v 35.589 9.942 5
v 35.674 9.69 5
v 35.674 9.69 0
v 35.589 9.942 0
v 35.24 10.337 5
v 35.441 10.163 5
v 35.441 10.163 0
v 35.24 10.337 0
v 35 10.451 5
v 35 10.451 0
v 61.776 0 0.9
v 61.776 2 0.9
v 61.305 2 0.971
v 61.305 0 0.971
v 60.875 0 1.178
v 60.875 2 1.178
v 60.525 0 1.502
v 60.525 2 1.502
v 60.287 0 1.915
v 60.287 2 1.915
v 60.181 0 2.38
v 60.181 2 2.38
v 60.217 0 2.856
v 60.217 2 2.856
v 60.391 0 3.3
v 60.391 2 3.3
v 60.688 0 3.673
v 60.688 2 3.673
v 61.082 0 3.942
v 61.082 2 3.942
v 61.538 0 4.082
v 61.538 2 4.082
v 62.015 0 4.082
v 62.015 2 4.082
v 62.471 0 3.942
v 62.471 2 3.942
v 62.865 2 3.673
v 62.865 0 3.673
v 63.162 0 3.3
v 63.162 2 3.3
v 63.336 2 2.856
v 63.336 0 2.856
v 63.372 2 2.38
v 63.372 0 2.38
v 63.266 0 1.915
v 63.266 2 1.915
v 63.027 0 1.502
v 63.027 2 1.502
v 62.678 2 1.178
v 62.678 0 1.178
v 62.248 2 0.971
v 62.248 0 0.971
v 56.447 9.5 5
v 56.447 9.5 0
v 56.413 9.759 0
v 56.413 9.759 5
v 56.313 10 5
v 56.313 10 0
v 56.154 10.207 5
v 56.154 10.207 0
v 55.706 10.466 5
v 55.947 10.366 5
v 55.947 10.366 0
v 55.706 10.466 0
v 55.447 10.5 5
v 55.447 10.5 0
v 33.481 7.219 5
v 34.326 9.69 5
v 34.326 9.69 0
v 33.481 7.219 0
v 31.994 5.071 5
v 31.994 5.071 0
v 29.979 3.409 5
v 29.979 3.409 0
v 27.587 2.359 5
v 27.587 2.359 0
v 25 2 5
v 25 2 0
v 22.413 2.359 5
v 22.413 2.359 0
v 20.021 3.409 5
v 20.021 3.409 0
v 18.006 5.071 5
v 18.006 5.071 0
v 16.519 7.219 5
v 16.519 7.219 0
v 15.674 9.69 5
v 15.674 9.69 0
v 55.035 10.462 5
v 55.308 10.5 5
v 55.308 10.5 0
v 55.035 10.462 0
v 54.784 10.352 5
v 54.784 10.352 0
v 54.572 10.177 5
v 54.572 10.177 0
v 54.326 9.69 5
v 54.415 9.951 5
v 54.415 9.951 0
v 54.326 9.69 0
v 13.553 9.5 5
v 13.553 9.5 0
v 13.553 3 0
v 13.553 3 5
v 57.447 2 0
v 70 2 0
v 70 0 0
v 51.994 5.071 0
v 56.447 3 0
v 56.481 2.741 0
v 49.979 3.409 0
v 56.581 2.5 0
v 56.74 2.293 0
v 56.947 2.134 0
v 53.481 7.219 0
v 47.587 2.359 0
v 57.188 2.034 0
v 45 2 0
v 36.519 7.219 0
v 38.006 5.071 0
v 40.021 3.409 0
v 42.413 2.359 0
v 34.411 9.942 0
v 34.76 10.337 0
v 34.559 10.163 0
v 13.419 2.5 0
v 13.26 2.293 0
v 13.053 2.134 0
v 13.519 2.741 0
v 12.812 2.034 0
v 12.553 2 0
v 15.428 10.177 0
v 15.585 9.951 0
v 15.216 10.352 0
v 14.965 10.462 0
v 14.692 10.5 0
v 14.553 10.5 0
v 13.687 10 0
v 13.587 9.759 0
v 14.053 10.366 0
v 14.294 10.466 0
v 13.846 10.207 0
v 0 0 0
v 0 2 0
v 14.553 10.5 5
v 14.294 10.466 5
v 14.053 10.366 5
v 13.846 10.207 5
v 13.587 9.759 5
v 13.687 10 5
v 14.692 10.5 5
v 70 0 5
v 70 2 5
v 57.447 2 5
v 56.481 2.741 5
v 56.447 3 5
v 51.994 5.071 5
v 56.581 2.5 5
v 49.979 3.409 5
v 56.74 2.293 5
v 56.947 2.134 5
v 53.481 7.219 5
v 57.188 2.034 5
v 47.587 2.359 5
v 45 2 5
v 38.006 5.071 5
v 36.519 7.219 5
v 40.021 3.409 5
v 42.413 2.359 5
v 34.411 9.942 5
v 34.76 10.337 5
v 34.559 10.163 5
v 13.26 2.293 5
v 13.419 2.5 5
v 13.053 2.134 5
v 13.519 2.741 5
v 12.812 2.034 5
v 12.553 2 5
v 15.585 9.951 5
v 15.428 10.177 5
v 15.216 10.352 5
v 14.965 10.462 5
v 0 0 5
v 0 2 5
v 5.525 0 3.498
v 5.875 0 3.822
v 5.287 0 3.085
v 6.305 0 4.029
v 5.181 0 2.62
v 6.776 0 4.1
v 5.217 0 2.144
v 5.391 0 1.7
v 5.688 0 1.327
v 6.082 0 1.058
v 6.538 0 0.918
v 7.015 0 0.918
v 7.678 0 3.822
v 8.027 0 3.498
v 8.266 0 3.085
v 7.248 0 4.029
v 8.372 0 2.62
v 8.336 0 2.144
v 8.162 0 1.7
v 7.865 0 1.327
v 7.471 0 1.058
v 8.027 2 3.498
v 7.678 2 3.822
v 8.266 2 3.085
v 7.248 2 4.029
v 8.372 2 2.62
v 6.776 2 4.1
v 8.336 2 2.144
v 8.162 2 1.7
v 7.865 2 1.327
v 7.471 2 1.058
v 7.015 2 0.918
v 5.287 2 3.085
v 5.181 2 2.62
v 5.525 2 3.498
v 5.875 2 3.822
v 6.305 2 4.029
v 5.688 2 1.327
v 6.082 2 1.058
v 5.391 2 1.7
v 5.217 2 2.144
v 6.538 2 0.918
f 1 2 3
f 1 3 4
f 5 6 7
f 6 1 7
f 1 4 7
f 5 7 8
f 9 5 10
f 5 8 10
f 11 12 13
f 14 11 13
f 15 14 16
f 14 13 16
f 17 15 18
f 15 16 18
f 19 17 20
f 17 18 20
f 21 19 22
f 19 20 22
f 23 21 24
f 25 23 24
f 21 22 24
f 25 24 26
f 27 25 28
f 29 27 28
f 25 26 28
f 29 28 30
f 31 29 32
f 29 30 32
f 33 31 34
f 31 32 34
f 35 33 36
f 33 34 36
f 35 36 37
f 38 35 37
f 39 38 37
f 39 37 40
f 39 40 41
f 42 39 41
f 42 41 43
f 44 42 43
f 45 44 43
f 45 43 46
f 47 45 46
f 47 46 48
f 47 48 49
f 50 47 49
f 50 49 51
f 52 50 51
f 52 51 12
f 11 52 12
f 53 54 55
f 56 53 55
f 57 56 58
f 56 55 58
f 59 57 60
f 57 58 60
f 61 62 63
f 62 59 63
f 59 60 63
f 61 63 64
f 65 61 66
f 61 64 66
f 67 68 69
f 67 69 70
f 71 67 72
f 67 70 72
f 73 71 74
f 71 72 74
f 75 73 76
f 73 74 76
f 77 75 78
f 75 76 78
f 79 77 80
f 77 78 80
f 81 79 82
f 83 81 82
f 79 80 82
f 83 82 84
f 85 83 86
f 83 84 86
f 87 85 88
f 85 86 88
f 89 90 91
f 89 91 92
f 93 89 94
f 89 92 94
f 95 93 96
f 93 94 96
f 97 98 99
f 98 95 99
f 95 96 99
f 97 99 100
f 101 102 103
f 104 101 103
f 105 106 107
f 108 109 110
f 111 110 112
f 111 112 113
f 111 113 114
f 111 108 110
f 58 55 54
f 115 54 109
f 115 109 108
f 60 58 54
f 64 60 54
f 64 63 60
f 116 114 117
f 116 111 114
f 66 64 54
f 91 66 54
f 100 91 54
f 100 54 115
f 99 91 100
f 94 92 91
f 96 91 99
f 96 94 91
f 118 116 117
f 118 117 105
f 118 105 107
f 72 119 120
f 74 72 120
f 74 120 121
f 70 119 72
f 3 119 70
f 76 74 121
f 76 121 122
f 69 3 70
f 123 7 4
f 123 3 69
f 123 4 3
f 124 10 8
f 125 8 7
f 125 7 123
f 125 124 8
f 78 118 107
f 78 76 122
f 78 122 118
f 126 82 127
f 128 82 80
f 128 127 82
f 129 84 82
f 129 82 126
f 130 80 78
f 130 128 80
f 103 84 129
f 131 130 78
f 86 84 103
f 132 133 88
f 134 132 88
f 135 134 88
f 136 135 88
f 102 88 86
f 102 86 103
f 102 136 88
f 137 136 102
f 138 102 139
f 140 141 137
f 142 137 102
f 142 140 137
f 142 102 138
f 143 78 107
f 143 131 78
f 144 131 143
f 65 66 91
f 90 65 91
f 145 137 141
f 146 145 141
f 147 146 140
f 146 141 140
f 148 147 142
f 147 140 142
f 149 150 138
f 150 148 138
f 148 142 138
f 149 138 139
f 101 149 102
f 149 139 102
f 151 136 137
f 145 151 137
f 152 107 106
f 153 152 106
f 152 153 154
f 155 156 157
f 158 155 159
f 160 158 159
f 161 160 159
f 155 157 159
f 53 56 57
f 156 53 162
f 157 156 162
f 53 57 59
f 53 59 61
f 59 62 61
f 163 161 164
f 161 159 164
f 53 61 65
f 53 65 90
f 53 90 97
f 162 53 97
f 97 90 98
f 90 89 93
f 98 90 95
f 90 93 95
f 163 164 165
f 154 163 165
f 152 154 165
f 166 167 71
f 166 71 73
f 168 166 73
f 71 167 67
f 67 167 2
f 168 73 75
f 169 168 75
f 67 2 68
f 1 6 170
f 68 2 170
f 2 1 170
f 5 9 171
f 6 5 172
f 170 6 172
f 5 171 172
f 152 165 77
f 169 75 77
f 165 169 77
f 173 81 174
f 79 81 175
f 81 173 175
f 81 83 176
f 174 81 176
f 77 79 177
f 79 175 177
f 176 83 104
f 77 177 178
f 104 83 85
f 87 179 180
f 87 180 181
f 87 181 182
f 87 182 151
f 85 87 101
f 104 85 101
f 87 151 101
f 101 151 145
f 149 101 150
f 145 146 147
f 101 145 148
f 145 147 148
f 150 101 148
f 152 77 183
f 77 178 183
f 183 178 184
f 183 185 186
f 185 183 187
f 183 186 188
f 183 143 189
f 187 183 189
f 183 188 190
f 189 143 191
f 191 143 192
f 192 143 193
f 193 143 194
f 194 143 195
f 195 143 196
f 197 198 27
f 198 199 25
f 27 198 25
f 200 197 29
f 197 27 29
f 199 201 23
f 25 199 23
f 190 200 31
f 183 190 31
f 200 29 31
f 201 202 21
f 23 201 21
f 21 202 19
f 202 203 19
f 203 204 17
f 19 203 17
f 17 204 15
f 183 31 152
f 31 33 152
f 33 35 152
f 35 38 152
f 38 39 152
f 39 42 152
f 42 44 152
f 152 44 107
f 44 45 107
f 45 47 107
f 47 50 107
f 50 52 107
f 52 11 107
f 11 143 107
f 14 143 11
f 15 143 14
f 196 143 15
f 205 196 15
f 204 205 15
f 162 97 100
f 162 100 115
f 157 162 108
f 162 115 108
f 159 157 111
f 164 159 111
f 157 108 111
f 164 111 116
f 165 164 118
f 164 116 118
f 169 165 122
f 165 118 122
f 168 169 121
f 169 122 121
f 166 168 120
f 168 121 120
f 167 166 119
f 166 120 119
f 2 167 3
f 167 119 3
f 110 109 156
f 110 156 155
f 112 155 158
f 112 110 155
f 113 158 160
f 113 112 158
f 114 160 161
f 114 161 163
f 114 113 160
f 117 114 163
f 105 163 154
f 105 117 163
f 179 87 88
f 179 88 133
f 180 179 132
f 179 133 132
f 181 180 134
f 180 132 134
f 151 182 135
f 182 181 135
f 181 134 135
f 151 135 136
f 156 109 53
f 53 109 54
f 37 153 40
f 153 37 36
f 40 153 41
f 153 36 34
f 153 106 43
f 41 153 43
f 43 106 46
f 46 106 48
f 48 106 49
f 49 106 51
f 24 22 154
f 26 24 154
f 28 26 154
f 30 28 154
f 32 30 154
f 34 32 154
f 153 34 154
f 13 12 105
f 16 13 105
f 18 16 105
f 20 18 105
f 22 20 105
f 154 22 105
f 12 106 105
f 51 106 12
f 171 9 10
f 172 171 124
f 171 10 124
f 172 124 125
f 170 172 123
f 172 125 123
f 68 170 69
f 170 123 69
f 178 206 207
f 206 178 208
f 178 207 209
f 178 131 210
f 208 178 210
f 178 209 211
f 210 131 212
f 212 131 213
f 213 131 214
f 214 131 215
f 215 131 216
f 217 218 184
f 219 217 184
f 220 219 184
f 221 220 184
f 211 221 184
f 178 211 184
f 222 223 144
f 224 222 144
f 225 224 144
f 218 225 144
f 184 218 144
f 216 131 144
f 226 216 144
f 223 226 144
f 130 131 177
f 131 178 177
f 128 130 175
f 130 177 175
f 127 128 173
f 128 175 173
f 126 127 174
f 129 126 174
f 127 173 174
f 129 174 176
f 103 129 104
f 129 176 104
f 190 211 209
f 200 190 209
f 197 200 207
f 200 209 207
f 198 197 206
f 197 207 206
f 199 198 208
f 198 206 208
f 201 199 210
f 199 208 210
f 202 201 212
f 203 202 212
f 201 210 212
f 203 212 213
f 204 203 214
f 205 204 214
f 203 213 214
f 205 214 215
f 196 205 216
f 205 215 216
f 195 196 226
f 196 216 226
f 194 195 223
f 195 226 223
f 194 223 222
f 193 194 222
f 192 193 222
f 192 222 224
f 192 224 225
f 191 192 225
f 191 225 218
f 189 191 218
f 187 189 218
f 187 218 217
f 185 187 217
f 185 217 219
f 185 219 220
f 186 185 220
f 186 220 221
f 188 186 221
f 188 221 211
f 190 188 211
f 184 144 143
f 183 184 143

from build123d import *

# Parameters (mm, degrees)
BOSS_EXTRU_1_DEPTH      = 5
ESQUISSE2_R             = 1.6
ENL_V_MAT_EXTRU_1_DEPTH = 71.691230008
CONG_1_R                = 1
CONG_2_R                = 1


with BuildPart() as part:
    # Esquisse1 → Boss.-Extru.1 (new body)
    with BuildSketch(Plane.XY):
        with BuildLine():
            Line((0, 0), (70, 0))
            Line((70, 0), (70, 2))
            Line((70, 2), (56.447221814, 2))
            Line((56.447221814, 2), (56.447221814, 10.5))
            Line((56.447221814, 10.5), (54.447221814, 10.5))
            ThreePointArc((54.447221814, 10.5), (45, 2), (35.552778186, 10.5))
            Line((35.552778186, 10.5), (34.447221814, 10.5))
            ThreePointArc((34.447221814, 10.5), (25, 2), (15.552778186, 10.5))
            Line((15.552778186, 10.5), (13.552778186, 10.5))
            Line((13.552778186, 10.5), (13.552778186, 2))
            Line((13.552778186, 2), (0, 2))
            Line((0, 2), (0, 0))
        make_face()
    extrude(amount=BOSS_EXTRU_1_DEPTH)

    # Esquisse2 → Enlèv. mat.-Extru.1 (cut, through all)
    with BuildSketch(Plane(origin=(0, 2, 0), x_dir=(1, 0, 0), z_dir=(0, 1, 0))):
        with Locations(Location((6.776389093, -2.5, 0), (0, 0, 270))):
            Circle(ESQUISSE2_R)
        with Locations(Location((61.776389093, -2.5, 0), (0, 0, 90))):
            Circle(ESQUISSE2_R)
    extrude(amount=-ENL_V_MAT_EXTRU_1_DEPTH, mode=Mode.SUBTRACT)

    # Congé1
    cong_1_edges = [part.edges().sort_by_distance(p)[0] for p in [
        (13.552778186, 2, 2.5),
    ]]
    fillet(cong_1_edges, radius=CONG_1_R)

    # Congé2
    # the kernel refuses this fillet: 1 mm, written as the material it adds along each edge
    with BuildSketch(Plane(origin=(56.447221814, 2, 0), x_dir=(1, 0, 0), z_dir=(0, 0, 1))) as cong_2_piece_1:
        with BuildLine():
            CenterArc((CONG_2_R, CONG_2_R), CONG_2_R, 180, 90)
            Line((0, CONG_2_R), (0, 0))
            Line((0, 0), (CONG_2_R, 0))
        make_face()
    extrude(amount=5)
    # the kernel refuses this fillet: 1 mm, written as the material it takes off along each edge
    with BuildSketch(Plane(origin=(13.552778186, 10.5, -2.5), x_dir=(0, -1, 0), z_dir=(0, 0, 1)), Plane(origin=(56.447221814, 10.5, -2.5), x_dir=(-1, 0, 0), z_dir=(0, 0, 1))) as cong_2_2_piece_1:
        with BuildLine():
            CenterArc((CONG_2_R, CONG_2_R), CONG_2_R, 180, 90)
            Line((0, CONG_2_R), (0, 0))
            Line((0, 0), (CONG_2_R, 0))
        make_face()
    extrude(amount=10, mode=Mode.SUBTRACT)
    with BuildSketch(Plane(origin=(15.552778186, 10.5, -2.151355625), x_dir=(-1, 0, 0), z_dir=(0, 0, 1)), Plane(origin=(35.552778186, 10.5, -2.151355625), x_dir=(-1, 0, 0), z_dir=(0, 0, 1))) as cong_2_2_piece_2:
        with BuildLine():
            CenterArc((0.86054225, 1), CONG_2_R, 190.980575428, 79.019424572)
            ThreePointArc((-0.121149565, 0.80952381), (-0.05185196, 0.406067322), (0, 0))
            Line((0, 0), (0.86054225, 0))
        make_face()
    extrude(amount=9.302711251, mode=Mode.SUBTRACT)
    with BuildSketch(Plane(origin=(34.447221814, 10.5, -2.151355625), x_dir=(-0.1480070865029111, -0.9889863003828312, 0), z_dir=(0, 0, 1)), Plane(origin=(54.447221814, 10.5, -2.151355625), x_dir=(-0.1480070865029111, -0.9889863003828312, 0), z_dir=(0, 0, 1))) as cong_2_2_piece_3:
        with BuildLine():
            CenterArc((0.861619949, 0.999071583), CONG_2_R, 188.511451923, 79.019424572)
            Line((-0.127366351, 0.851064496), (0, 0))
            ThreePointArc((0, 0), (0.409269476, 0.008819963), (0.818538952, 0))
        make_face()
    extrude(amount=9.302711251, mode=Mode.SUBTRACT)


solid = part.part
